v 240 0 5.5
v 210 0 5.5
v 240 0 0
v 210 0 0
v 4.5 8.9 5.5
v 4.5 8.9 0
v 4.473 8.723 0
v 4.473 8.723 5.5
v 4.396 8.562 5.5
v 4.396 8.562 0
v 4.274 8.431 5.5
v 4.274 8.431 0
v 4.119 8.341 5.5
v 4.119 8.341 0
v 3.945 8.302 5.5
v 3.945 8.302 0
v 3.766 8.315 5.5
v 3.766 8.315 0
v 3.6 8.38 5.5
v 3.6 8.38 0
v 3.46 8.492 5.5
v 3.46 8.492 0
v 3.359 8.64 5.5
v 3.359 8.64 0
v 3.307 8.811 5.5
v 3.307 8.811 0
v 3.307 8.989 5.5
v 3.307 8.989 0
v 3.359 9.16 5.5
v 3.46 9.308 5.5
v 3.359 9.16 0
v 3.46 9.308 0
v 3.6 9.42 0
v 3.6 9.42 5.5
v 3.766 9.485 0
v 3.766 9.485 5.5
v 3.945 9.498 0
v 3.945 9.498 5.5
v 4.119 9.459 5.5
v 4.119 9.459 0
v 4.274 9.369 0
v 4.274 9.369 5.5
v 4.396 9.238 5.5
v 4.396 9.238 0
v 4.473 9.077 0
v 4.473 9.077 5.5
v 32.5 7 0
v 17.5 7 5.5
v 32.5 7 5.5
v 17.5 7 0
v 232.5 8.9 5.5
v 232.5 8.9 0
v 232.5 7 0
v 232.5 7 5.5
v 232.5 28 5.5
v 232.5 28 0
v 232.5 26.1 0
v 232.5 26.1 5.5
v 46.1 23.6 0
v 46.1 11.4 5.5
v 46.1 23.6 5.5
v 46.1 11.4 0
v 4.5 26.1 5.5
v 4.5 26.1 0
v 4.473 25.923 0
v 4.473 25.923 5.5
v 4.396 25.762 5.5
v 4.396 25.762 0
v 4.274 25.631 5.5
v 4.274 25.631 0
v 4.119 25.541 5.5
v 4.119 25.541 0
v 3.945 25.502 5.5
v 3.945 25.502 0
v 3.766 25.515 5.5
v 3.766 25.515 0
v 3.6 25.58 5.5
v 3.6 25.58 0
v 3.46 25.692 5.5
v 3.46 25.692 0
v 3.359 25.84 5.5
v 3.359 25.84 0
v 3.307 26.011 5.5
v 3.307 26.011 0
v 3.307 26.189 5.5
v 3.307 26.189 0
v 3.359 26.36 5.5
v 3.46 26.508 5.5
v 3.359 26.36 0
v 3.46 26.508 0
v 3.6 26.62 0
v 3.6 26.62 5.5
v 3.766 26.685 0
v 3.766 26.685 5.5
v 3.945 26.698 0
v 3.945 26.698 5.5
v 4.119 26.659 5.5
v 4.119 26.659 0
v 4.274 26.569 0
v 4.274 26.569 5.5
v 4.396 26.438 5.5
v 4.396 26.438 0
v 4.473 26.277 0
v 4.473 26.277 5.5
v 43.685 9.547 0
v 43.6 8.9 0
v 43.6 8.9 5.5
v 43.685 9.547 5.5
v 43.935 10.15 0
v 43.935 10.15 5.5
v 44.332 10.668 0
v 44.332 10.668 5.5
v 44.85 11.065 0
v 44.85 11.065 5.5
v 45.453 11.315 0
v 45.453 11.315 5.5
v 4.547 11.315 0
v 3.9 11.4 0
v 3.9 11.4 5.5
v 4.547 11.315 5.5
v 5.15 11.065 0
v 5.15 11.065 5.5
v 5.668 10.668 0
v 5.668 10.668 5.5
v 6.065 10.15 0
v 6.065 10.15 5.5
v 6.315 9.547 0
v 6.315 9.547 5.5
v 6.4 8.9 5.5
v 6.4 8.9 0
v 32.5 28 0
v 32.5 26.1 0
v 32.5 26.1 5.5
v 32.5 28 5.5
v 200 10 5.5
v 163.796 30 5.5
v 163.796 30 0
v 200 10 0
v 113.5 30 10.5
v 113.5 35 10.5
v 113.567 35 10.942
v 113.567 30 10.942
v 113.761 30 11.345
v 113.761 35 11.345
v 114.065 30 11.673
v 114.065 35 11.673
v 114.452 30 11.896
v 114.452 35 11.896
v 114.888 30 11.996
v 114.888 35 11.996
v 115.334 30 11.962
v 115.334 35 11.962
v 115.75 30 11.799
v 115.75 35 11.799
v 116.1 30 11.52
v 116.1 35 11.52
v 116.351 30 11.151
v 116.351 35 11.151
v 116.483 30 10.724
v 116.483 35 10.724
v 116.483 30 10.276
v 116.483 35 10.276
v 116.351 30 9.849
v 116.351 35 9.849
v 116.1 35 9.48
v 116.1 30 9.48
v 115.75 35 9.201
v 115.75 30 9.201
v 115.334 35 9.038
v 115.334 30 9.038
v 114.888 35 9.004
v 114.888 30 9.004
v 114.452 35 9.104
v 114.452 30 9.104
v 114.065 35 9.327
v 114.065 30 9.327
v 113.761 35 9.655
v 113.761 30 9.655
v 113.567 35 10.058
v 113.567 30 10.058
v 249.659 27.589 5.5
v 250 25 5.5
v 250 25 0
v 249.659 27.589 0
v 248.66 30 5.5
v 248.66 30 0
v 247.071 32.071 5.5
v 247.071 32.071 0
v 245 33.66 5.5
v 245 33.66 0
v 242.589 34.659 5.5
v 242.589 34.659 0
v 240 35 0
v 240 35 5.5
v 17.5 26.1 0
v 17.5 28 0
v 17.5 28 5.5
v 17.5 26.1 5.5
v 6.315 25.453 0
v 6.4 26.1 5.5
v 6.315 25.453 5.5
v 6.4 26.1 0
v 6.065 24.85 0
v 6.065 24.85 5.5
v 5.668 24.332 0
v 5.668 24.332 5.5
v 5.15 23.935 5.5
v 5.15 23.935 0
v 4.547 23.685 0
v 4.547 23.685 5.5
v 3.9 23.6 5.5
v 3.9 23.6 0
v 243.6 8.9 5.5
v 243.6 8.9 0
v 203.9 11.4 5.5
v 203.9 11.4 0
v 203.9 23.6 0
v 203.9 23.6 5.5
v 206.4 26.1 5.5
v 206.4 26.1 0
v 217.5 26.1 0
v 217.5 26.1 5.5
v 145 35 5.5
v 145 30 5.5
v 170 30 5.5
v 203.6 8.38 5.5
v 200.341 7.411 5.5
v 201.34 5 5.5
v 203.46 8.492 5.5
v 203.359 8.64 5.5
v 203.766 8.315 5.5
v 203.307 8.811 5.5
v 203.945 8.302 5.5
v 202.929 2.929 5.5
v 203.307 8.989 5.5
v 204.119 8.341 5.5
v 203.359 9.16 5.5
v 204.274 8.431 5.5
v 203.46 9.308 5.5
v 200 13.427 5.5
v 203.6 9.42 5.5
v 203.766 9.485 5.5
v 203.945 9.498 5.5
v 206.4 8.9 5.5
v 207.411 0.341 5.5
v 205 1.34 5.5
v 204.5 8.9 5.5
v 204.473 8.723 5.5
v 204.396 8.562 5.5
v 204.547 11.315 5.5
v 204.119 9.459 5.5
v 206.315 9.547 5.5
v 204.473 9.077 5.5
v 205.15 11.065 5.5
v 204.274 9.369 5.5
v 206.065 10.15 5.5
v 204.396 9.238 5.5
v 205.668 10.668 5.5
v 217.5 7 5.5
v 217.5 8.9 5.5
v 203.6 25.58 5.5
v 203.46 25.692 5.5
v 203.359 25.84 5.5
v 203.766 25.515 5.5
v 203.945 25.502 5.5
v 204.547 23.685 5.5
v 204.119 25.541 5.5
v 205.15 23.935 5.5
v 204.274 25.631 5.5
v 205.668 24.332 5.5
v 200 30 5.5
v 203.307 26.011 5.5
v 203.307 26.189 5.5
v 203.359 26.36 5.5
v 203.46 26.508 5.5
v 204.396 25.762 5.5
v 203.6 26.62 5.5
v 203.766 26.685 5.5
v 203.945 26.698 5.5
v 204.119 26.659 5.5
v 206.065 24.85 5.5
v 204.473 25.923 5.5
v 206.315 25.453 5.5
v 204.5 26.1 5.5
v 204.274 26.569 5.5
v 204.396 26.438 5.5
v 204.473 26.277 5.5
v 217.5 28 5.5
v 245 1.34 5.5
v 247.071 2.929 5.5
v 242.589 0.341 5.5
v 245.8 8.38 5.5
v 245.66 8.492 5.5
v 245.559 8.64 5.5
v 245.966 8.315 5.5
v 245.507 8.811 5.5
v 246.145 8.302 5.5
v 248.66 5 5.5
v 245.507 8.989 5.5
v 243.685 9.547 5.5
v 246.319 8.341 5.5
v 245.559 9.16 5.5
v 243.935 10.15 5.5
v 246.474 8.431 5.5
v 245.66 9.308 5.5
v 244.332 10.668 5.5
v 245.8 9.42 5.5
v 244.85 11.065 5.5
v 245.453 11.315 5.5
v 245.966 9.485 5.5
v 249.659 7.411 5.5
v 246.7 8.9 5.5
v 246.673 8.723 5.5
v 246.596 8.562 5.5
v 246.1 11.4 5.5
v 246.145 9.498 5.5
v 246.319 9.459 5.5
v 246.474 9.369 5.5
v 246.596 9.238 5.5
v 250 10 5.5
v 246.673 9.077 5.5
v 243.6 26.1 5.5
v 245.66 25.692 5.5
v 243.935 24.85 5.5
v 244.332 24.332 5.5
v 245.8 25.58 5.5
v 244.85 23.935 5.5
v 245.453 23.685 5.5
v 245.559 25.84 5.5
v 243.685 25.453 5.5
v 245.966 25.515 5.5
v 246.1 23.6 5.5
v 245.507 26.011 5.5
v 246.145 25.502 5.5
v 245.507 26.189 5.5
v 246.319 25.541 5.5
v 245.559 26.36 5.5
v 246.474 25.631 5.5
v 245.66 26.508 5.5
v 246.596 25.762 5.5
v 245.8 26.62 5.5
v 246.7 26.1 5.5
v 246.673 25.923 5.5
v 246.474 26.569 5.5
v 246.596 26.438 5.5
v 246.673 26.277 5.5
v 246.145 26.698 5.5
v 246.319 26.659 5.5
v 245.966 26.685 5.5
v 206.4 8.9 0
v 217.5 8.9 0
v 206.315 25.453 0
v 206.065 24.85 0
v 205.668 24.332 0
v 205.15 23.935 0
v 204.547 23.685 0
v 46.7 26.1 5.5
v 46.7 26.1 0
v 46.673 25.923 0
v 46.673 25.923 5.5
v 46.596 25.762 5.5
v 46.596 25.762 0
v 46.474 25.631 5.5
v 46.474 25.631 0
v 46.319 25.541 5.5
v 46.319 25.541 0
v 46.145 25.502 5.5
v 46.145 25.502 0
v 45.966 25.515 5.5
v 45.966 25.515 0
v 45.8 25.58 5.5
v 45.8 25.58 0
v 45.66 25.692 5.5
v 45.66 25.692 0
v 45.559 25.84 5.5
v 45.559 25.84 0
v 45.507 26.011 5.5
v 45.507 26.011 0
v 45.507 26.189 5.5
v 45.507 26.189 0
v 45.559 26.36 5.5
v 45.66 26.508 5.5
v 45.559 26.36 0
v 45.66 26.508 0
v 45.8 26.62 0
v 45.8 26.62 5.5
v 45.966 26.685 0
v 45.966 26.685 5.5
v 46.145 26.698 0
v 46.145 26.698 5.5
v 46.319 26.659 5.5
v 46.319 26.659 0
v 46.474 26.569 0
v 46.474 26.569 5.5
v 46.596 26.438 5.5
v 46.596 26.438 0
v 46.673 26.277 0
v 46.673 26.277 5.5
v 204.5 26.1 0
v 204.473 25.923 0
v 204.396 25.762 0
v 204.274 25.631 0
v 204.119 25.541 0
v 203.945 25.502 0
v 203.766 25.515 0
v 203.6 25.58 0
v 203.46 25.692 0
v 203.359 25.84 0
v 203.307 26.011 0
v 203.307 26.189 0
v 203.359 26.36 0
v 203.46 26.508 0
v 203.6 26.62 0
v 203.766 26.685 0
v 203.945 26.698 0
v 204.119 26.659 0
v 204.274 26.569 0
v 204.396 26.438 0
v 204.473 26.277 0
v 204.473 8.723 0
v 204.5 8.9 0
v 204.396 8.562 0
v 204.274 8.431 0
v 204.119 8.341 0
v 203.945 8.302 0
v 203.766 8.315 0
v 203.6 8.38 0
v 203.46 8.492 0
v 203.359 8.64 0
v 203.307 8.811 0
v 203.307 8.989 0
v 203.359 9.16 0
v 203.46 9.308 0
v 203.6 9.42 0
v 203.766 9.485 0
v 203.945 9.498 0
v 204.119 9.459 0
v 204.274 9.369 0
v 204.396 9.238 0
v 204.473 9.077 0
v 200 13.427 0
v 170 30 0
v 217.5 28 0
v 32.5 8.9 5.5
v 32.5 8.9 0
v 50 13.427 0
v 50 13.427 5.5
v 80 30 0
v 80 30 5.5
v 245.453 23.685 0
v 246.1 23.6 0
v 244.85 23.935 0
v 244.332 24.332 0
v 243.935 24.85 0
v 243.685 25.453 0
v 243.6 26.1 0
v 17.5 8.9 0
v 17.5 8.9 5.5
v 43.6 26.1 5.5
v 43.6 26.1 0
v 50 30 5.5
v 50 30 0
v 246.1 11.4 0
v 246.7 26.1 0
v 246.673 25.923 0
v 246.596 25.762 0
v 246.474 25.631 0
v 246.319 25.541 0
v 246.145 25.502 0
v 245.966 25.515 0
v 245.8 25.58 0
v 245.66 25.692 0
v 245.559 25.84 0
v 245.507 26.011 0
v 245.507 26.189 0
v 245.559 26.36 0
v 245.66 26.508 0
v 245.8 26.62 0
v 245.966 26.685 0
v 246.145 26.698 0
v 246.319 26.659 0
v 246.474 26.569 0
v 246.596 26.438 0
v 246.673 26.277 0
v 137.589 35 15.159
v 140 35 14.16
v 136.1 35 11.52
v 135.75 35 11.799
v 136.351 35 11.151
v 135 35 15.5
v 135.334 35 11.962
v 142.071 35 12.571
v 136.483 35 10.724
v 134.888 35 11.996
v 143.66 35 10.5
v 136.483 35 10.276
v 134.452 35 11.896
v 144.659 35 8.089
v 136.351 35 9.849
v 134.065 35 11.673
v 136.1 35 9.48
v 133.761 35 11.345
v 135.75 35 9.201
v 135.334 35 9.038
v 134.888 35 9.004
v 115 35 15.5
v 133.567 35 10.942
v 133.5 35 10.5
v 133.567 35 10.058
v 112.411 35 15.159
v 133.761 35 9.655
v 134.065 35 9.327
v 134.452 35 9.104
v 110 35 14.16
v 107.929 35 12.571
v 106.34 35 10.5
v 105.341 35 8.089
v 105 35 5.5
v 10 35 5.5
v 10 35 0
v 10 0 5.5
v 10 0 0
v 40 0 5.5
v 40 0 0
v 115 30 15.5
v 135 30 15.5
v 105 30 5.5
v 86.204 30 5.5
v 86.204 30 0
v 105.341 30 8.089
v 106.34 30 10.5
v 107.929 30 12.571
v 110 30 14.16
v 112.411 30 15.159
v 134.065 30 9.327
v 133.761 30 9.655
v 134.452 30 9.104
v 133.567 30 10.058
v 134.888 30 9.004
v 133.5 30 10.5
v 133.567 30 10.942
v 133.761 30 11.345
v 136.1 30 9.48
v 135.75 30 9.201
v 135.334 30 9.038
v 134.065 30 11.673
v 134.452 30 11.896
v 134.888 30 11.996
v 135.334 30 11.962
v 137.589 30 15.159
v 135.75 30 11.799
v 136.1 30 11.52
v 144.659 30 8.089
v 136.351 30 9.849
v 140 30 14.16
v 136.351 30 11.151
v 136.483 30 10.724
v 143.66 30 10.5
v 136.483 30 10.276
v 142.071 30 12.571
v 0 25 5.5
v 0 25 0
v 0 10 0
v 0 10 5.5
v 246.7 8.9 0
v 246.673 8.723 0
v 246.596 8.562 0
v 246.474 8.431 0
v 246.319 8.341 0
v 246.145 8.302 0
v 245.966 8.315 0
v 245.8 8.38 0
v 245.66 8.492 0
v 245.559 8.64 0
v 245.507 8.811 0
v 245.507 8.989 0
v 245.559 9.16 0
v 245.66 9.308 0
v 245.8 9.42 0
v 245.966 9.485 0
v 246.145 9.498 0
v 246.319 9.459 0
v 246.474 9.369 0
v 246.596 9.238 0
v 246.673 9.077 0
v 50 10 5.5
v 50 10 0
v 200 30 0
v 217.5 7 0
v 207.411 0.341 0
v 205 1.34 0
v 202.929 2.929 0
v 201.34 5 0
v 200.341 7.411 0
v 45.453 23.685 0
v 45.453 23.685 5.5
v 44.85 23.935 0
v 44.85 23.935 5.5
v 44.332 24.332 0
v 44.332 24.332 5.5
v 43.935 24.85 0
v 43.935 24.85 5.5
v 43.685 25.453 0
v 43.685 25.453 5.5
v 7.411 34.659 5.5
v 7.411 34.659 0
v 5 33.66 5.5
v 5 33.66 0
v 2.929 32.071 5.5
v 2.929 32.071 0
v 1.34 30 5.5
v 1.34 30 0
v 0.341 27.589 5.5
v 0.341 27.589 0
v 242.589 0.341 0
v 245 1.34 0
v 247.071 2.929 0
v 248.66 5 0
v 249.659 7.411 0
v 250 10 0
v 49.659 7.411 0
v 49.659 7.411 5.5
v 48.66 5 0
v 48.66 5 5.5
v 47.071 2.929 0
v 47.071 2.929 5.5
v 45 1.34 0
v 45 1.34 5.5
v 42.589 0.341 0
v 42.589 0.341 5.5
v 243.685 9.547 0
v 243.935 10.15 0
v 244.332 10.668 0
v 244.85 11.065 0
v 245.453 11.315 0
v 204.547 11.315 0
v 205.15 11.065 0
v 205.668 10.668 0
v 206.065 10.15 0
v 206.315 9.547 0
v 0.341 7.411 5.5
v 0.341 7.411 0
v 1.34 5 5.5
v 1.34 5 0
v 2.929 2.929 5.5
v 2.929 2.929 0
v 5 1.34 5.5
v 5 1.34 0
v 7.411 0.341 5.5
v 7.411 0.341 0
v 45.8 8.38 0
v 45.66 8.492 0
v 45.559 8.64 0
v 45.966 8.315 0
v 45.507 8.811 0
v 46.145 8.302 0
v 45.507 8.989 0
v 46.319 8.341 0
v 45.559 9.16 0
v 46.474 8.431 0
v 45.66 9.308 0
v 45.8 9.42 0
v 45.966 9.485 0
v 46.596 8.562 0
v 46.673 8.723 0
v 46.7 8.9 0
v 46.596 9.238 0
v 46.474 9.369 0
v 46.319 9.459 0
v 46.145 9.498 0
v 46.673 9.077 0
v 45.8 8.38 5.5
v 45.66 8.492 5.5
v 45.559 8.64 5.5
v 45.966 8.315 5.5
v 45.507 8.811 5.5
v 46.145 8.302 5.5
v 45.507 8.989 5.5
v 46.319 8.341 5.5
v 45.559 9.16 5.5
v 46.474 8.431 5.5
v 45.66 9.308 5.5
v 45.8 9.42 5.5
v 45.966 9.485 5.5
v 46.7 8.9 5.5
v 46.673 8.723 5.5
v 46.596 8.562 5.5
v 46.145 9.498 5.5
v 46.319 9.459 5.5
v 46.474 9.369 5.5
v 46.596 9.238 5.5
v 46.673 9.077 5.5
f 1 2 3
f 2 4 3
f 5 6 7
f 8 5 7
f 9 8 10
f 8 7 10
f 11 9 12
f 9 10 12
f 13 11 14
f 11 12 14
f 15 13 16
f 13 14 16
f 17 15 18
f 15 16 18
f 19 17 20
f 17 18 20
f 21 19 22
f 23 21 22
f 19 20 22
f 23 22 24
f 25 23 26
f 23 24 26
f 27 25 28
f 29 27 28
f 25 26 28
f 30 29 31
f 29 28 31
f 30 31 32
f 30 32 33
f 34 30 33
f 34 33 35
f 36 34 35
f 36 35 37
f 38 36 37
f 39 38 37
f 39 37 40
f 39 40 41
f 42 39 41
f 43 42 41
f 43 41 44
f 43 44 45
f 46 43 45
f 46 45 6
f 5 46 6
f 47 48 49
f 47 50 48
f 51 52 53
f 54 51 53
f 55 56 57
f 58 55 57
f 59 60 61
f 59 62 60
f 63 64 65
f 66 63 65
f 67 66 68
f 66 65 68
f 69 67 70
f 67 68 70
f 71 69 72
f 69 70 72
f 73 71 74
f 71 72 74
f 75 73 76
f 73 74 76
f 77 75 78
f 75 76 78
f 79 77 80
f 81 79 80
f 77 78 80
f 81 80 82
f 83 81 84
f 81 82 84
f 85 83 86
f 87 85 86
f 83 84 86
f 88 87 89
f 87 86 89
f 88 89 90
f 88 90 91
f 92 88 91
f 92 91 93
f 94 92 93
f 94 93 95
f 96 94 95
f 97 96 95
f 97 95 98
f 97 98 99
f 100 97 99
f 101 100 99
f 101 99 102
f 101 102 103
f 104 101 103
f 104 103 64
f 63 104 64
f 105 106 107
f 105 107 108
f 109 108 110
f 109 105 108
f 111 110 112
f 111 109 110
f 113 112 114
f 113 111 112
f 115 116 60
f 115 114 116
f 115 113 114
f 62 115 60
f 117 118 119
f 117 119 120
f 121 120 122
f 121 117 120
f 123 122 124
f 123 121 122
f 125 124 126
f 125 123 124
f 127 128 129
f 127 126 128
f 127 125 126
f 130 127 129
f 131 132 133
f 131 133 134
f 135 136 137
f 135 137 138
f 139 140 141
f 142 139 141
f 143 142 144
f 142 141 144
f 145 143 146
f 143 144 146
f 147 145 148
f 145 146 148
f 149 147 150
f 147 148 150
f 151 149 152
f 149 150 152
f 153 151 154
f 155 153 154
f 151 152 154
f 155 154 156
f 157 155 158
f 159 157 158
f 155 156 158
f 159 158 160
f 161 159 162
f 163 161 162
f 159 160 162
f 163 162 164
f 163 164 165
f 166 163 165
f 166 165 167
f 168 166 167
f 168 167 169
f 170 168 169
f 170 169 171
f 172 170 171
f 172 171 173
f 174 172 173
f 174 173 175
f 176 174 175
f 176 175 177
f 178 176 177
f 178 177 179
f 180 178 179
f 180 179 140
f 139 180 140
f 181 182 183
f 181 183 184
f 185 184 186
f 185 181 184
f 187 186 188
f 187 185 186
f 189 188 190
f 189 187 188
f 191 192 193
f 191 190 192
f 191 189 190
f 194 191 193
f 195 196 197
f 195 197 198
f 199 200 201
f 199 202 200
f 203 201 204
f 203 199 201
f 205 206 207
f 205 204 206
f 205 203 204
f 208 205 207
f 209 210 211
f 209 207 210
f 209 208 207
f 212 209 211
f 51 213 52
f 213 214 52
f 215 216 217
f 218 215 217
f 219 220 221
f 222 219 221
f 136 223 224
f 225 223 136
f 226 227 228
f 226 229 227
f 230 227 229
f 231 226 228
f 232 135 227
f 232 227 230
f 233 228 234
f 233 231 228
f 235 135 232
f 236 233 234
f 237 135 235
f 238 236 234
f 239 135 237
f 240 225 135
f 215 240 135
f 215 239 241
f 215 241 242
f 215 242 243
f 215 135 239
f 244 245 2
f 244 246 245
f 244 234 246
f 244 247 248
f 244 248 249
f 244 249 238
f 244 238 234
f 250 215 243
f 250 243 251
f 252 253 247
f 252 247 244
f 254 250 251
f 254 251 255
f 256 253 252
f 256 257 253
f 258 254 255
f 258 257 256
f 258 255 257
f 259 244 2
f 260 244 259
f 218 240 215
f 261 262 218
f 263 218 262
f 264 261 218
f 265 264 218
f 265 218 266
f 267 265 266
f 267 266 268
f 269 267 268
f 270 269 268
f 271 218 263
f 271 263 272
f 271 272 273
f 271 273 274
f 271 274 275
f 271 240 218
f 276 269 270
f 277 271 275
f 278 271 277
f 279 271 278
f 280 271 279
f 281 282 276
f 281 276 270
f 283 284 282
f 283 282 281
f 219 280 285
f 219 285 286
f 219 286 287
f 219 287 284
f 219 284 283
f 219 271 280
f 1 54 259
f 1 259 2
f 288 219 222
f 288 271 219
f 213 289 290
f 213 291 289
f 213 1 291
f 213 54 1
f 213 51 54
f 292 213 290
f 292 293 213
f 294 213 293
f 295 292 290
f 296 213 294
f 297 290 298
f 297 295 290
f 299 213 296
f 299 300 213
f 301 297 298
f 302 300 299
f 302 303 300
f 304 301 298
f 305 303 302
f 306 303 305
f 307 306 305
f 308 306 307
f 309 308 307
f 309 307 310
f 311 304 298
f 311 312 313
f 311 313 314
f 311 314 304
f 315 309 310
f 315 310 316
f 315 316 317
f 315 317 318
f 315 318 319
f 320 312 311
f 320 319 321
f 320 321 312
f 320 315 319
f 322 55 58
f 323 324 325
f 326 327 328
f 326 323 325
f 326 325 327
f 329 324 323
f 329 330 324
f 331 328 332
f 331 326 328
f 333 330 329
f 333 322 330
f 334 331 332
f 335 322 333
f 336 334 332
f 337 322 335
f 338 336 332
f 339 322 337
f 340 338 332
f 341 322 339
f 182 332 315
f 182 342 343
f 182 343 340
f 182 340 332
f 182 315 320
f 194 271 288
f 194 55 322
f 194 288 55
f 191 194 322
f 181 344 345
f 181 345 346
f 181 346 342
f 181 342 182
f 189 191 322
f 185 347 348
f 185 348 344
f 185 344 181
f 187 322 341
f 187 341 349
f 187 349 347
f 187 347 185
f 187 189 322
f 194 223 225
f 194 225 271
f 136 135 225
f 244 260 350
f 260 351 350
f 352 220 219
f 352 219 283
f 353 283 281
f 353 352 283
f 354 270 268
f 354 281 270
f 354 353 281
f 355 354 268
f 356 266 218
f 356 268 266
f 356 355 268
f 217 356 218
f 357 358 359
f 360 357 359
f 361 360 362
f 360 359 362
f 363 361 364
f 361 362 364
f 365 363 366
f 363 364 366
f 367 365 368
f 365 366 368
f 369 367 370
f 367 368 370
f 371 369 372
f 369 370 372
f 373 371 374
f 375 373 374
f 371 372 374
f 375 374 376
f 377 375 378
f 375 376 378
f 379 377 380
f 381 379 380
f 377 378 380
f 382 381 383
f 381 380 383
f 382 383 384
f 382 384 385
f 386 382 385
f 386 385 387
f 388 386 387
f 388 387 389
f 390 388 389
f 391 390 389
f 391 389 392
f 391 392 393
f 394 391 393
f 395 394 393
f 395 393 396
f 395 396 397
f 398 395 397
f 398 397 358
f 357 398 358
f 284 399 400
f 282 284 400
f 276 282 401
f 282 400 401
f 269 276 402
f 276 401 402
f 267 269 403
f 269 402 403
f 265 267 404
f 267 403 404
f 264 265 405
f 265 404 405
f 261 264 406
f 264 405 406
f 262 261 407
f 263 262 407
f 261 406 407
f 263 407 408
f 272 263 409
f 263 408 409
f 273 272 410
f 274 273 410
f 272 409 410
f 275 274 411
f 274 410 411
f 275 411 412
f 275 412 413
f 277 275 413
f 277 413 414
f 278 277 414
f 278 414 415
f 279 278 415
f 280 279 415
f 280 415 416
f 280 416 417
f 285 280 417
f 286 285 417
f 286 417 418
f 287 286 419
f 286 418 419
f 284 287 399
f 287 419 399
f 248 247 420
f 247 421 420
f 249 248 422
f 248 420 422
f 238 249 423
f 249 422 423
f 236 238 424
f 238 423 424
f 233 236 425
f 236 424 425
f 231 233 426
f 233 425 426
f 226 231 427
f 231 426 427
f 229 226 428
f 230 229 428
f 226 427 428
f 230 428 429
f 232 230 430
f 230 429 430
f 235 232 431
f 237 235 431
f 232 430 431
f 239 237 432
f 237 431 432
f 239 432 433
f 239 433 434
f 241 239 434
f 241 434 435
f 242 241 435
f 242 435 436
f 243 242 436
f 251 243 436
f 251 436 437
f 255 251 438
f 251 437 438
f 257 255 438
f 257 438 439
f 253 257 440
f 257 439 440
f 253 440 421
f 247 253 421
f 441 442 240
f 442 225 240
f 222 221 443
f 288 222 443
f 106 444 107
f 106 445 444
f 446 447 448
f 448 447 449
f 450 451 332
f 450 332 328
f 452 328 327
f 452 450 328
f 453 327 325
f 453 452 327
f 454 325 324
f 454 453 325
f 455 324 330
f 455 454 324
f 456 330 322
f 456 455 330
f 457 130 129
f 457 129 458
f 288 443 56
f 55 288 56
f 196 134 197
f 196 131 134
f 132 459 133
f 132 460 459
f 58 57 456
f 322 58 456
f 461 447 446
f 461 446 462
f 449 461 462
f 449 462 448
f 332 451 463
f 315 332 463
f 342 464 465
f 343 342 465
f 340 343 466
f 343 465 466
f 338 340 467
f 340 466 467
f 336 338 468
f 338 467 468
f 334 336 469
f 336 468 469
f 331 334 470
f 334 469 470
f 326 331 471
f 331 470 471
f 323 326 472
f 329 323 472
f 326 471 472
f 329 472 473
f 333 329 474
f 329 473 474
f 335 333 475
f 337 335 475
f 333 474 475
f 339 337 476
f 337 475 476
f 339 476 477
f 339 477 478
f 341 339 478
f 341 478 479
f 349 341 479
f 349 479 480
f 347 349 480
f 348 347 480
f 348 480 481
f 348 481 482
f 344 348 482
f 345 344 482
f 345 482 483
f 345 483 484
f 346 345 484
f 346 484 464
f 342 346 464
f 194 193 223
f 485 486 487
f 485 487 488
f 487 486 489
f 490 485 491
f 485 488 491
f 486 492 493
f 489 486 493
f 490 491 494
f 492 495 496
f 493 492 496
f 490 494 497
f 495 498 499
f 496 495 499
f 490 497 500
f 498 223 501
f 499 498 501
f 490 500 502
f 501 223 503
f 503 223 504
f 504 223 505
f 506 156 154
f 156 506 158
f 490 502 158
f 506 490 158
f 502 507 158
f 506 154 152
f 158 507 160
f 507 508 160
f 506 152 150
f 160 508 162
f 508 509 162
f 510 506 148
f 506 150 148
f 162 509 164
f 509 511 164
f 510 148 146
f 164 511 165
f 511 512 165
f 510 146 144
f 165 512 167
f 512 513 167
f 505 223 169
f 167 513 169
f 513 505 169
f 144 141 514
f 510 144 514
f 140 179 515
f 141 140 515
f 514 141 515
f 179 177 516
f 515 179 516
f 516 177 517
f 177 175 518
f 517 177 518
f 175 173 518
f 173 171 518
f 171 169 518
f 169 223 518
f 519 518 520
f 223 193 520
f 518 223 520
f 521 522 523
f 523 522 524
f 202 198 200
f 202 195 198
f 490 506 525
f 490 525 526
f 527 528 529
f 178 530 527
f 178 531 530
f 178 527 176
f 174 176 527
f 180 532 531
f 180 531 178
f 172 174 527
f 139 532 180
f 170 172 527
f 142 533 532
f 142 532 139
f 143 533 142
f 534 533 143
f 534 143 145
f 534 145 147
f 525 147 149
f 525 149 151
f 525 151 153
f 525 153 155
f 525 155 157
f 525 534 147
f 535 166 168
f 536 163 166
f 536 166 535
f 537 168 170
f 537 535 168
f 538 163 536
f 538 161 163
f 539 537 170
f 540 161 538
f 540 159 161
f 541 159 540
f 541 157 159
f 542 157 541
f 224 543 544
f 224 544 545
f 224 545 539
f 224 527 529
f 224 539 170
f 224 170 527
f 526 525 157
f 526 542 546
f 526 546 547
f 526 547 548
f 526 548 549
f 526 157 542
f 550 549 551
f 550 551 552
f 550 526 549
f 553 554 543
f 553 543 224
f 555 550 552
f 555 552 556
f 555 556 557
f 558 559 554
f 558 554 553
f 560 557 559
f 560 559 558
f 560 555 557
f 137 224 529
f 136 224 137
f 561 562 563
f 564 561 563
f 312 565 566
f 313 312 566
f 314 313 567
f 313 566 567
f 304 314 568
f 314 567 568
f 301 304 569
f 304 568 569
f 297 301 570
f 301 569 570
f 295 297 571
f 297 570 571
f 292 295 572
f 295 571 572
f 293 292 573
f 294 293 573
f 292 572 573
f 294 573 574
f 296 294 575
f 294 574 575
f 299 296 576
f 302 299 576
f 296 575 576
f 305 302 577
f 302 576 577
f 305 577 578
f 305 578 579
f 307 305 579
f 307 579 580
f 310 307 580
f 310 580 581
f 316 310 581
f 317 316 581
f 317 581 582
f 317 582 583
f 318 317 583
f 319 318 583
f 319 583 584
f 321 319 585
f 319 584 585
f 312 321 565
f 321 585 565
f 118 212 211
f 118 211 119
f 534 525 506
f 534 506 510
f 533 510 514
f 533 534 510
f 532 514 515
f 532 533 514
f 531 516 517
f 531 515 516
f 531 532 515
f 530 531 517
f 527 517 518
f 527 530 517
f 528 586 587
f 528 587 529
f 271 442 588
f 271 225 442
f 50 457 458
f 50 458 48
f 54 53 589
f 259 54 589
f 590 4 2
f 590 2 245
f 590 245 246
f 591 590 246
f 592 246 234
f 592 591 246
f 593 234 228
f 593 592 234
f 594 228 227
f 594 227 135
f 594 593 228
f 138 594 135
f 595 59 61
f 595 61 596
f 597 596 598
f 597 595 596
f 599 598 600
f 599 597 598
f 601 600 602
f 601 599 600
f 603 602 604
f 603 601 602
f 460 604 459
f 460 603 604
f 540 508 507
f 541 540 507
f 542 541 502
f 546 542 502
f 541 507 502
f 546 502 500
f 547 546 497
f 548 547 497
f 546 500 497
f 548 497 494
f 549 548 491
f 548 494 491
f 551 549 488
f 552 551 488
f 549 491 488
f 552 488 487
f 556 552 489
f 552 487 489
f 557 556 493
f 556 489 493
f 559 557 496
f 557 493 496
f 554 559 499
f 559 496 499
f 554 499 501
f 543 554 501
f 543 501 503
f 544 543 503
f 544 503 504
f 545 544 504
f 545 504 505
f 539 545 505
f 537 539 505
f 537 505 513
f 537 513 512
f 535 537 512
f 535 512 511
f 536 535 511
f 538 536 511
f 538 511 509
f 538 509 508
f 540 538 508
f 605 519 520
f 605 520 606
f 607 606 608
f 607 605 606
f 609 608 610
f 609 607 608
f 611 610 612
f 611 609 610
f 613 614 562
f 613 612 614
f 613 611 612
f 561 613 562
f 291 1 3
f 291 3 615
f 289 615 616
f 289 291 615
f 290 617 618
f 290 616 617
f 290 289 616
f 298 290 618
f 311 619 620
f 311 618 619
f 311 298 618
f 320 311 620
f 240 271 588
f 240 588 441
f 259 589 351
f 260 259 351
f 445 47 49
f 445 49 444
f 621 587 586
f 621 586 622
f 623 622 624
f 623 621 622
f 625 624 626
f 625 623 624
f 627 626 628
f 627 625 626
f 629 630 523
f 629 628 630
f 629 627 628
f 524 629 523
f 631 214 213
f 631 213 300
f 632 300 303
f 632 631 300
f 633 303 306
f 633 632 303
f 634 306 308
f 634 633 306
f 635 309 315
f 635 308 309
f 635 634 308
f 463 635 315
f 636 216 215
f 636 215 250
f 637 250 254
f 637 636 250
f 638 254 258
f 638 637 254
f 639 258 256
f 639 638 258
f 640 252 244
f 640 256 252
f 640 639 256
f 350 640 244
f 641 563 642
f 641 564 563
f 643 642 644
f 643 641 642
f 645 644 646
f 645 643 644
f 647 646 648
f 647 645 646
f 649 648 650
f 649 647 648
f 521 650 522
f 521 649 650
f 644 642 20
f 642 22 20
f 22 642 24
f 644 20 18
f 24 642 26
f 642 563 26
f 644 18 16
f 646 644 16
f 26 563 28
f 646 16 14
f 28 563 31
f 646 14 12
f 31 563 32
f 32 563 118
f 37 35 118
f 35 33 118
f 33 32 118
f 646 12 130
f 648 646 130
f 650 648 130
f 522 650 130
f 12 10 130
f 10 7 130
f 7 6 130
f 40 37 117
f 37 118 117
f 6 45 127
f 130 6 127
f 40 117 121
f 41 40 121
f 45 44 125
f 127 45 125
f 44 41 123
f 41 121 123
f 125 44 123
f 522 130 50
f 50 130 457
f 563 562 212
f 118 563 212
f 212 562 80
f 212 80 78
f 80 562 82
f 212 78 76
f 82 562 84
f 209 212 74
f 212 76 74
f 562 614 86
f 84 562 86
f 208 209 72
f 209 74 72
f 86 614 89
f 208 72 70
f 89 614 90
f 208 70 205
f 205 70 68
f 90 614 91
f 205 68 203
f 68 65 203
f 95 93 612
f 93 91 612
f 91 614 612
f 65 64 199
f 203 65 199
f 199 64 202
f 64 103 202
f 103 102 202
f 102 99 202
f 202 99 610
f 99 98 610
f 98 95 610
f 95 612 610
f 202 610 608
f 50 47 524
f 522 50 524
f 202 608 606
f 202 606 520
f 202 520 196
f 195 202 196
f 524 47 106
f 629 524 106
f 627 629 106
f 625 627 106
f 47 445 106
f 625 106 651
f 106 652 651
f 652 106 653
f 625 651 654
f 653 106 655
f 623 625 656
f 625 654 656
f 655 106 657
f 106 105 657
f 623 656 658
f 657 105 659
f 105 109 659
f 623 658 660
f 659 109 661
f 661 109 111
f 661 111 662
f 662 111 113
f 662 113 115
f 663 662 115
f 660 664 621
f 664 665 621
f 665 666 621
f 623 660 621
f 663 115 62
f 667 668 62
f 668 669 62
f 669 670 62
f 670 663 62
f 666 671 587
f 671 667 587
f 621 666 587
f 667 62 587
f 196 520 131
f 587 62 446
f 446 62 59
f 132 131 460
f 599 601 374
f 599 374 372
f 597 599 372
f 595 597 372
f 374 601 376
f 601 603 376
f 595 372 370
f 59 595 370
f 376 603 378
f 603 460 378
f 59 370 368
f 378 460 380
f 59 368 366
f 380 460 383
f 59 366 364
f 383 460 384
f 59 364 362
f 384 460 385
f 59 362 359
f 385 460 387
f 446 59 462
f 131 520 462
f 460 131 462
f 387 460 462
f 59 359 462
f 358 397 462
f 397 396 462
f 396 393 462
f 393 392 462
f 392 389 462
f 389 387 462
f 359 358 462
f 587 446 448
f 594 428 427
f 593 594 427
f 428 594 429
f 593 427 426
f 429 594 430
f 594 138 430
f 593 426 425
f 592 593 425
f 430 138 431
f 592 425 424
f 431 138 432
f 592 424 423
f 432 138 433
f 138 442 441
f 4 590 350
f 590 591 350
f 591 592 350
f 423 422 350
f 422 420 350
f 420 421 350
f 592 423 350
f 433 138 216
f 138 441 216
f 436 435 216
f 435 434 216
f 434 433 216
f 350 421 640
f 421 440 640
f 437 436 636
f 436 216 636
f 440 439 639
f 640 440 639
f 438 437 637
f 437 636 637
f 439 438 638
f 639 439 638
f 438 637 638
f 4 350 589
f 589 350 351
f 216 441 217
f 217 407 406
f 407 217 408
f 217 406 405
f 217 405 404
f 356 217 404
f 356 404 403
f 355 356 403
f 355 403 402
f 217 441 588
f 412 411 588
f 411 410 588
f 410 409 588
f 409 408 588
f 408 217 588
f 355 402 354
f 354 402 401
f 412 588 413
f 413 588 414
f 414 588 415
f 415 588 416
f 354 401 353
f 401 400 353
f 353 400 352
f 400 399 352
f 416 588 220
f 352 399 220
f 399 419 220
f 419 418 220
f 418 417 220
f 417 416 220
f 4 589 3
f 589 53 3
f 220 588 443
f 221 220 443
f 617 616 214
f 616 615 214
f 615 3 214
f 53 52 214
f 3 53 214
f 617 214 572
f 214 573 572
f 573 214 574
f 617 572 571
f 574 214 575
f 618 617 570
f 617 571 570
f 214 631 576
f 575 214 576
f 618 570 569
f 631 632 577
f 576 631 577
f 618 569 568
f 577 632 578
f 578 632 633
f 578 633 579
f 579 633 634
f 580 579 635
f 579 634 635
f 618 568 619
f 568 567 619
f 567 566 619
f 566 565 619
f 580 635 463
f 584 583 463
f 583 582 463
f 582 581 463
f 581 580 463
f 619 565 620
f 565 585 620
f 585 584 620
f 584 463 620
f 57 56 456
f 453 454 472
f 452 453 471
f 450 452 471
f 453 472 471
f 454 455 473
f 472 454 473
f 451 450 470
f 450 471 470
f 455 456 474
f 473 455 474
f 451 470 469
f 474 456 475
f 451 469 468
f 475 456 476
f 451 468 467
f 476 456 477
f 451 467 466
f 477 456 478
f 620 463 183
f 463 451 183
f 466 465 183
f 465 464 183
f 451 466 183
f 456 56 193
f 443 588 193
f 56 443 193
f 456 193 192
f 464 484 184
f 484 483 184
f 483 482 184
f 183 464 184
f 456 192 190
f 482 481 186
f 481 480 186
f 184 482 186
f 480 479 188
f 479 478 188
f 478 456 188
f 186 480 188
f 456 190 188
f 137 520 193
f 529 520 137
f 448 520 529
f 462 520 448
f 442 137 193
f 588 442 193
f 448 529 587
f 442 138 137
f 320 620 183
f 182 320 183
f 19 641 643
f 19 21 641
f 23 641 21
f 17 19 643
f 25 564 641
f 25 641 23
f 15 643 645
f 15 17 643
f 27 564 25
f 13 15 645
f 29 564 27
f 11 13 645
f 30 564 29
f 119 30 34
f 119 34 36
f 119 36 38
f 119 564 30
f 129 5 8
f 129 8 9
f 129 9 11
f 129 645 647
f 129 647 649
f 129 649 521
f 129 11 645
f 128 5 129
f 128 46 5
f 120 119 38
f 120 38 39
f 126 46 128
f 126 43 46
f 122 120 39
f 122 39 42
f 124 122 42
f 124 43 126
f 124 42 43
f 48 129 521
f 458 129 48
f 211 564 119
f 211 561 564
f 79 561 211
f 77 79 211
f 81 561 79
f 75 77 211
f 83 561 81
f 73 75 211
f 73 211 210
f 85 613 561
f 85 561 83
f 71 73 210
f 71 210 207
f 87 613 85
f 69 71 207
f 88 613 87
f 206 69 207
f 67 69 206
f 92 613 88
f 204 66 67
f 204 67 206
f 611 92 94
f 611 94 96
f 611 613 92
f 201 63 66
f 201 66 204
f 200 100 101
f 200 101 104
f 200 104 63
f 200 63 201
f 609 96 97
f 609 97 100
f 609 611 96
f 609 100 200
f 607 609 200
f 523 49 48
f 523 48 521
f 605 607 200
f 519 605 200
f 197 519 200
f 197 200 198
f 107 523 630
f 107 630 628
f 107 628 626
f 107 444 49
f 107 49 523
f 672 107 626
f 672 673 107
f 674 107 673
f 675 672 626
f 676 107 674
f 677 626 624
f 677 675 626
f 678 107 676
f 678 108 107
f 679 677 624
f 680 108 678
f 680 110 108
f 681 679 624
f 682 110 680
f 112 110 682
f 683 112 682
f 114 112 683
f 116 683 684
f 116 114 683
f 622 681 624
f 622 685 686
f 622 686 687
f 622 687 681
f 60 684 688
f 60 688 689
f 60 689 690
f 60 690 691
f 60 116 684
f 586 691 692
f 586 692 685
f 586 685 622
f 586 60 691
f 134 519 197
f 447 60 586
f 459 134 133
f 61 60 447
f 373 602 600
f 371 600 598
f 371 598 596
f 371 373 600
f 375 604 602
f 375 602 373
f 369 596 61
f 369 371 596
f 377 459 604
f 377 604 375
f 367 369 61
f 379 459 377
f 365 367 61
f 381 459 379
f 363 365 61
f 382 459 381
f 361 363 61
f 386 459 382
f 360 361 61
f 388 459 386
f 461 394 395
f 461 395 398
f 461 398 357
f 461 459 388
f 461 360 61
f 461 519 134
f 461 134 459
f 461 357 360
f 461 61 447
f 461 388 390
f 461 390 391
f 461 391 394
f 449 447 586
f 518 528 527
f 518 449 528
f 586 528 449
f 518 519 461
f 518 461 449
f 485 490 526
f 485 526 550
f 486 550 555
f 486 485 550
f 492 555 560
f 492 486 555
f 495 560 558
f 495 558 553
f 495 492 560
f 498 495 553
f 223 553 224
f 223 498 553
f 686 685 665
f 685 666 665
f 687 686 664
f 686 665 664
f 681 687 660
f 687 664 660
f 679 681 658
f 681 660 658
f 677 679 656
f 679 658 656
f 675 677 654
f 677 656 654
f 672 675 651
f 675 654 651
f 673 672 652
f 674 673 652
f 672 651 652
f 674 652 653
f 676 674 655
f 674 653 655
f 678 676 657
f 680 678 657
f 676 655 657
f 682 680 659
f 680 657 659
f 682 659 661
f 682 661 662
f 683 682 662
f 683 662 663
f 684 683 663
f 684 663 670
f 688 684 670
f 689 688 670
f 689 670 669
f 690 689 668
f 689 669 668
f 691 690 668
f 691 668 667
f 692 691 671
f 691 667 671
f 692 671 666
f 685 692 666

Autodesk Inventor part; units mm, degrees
ref_plane "YZ Plane" through (0, 0, 0) normal (1, 0, 0) x (0, 1, 0)
ref_plane "XZ Plane" through (0, 0, 0) normal (0, 1, 0) x (-1, 0, 0)
ref_plane "XY Plane" through (0, 0, 0) normal (0, 0, 1) x (1, 0, 0)
sketch "Sketch1" plane through (0, 0, 0) normal (0, 0, 1) x (1, 0, 0)
  line L0 (0, 0) -> (250, 0)
  line L1 (250, 0) -> (250, 35)
  line L2 (250, 35) -> (0, 35)
  line L3 (0, 35) -> (0, 0)
  line L4 (25, 35) -> (25, 0)
  line L5 (3.9, 8.9) -> (46.1, 8.9)
  line L6 (46.1, 8.9) -> (46.1, 26.1)
  line L7 (46.1, 26.1) -> (3.9, 26.1)
  line L8 (3.9, 26.1) -> (3.9, 8.9)
  line L9 (3.9, 8.9) -> (46.1, 26.1) construction
  line L10 (46.1, 8.9) -> (3.9, 26.1) construction
  circle A0 centre (3.9, 26.1) radius 2.5
  circle A1 centre (46.1, 26.1) radius 2.5
  circle A2 centre (3.9, 8.9) radius 2.5
  circle A3 centre (46.1, 8.9) radius 2.5
  circle A4 centre (3.9, 26.1) radius 0.6
  circle A5 centre (46.1, 26.1) radius 0.6
  circle A6 centre (3.9, 8.9) radius 0.6
  circle A7 centre (46.1, 8.9) radius 0.6
  line L11 (125, 35) -> (125, 0)
  line L12 (225, 35) -> (225, 0)
  line L13 (246.1, 8.9) -> (203.9, 8.9)
  line L14 (203.9, 8.9) -> (203.9, 26.1)
  line L15 (203.9, 26.1) -> (246.1, 26.1)
  line L16 (246.1, 26.1) -> (246.1, 8.9)
  line L17 (246.1, 8.9) -> (203.9, 26.1) construction
  line L18 (203.9, 8.9) -> (246.1, 26.1) construction
  circle A8 centre (246.1, 26.1) radius 2.5
  circle A9 centre (203.9, 26.1) radius 2.5
  circle A10 centre (246.1, 8.9) radius 2.5
  circle A11 centre (203.9, 8.9) radius 2.5
  circle A12 centre (246.1, 26.1) radius 0.6
  circle A13 centre (203.9, 26.1) radius 0.6
  circle A14 centre (246.1, 8.9) radius 0.6
  circle A15 centre (203.9, 8.9) radius 0.6
  line L19 (17.5, 7) -> (32.5, 7)
  line L20 (32.5, 7) -> (32.5, 28)
  line L21 (32.5, 28) -> (17.5, 28)
  line L22 (17.5, 28) -> (17.5, 7)
  line L23 (17.5, 7) -> (32.5, 28) construction
  line L24 (32.5, 7) -> (17.5, 28) construction
  line L25 (46.1, 26.1) -> (3.9, 26.1)
  line L26 (232.5, 7) -> (217.5, 7)
  line L27 (217.5, 7) -> (217.5, 28)
  line L28 (217.5, 28) -> (232.5, 28)
  line L29 (232.5, 28) -> (232.5, 7)
  point P0 (25, 17.5)
  point P1 (225, 17.5)
  point P2 (6.4, 26.1)
  point P3 (17.5, 26.1)
  point P4 (32.5, 26.1)
  point P5 (43.6, 26.1)
  point P6 (46.1, 23.6)
  point P7 (46.1, 11.4)
  point P8 (43.6, 8.9)
  point P9 (32.5, 8.9)
  point P10 (17.5, 8.9)
  point P11 (6.4, 8.9)
  point P12 (3.9, 11.4)
  point P13 (3.9, 23.6)
  point P14 (217.5, 8.9)
  point P15 (206.4, 8.9)
  point P16 (203.9, 11.4)
  point P17 (203.9, 23.6)
  point P18 (206.4, 26.1)
  point P19 (217.5, 26.1)
  point P20 (232.5, 26.1)
  point P21 (243.6, 26.1)
  point P22 (246.1, 23.6)
  point P23 (246.1, 11.4)
  point P24 (243.6, 8.9)
  point P25 (232.5, 8.9)
  dimension "d0" = 250
  dimension "d1" = 35
  dimension "d2" = 17.2
  dimension "d3" = 42.2
  dimension "d4" = 5
  dimension "d5" = 5
  dimension "d6" = 5
  dimension "d7" = 5
  dimension "d8" = 1.2
  dimension "d9" = 1.2
  dimension "d10" = 1.2
  dimension "d11" = 1.2
  dimension "d12" = 25
  dimension "d13" = 15
  dimension "d14" = 21
extrude "Extrusion1" add sketch "Sketch1" along normal blind 5.5 contours L3 L2 L4 L21 L22 L7 A0 L8 A2 L5 L19 L0 | L4 L19 L20 L5 A3 L6 A1 L7 L21 L2 L11 L0 | L11 L2 L12 L28 L27 L15 A9 L14 A11 L13 L26 L0 | L12 L26 L29 L13 A10 L16 A8 L15 L28 L2 L1 L0 | A2 L8 A6 L5 | L5 A6 L8 A2 | A3 L6 A7 L5 | L5 A7 L6 A3 | A1 L6 A5 L7 | L7 A5 L6 A1 | A0 L8 A4 L7 | L7 A4 L8 A0 | A6 L8 L5 | L5 L8 A6 | A7 L6 L5 | L5 L6 A7 | A10 L16 A14 L13 | L13 A14 L16 A10 | A11 L14 A15 L13 | L13 A15 L14 A11 | A5 L6 L7 | L7 L6 A5 | A4 L8 L7 | L7 L8 A4 | A9 L14 A13 L15 | L15 A13 L14 A9 | A8 L16 A12 L15 | L15 A12 L16 A8 | A14 L16 L13 | L13 L16 A14 | A15 L14 L13 | L13 L14 A15 | A13 L14 L15 | L15 L14 A13 | A12 L16 L15 | L15 L16 A12
extrude "Extrusion2" cut sketch "Sketch1" along normal blind 5.5 contours A6 L8 L5 | L5 L8 A6 | A7 L6 L5 | L5 L6 A7 | A5 L6 L7 | L7 L6 A5 | A4 L8 L7 | L7 L8 A4 | A14 L16 L13 | L13 L16 A14 | A15 L14 L13 | L13 L14 A15 | A13 L14 L15 | L15 L14 A13 | A12 L16 L15 | L15 L16 A12
sketch "Sketch2" plane through (0, 0, 5.5) normal (0, 0, 1) x (1, 0, 0)
  line L0 (200, -30) -> (50, -30)
  line L1 (50, -30) -> (50, 30)
  line L2 (50, 30) -> (200, 30)
  line L3 (200, 30) -> (200, -30)
  line L4 (0, 0) -> (250, 0) projected
  line L5 (200, -30) -> (50, 30) construction
  line L6 (50, -30) -> (200, 30) construction
  point P0 (125, 0)
  point P1 (50, 0)
  point P2 (200, 0)
  dimension "d19" = 150
  dimension "d20" = 60
extrude "Extrusion3" cut sketch "Sketch2" against normal blind 5.5 contours L4 L1 L2 L3
sketch "Sketch3" plane through (0, 0, 5.5) normal (0, 0, 1) x (1, 0, 0)
  line L0 (50, 30) -> (200, 30) projected
  line L1 (105, 30) -> (145, 30)
  line L2 (145, 30) -> (145, 35)
  line L3 (145, 35) -> (105, 35)
  line L4 (105, 35) -> (105, 30)
  point P0 (0, 0)
  point P1 (145, 30)
  dimension "d23" = 40
  dimension "d24" = 5
  dimension "d25" = 55
extrude "Extrusion4" add sketch "Sketch3" along normal blind 10
sketch "Sketch4" plane through (105, 35, 5.5) normal (0, 1, 0) x (-1, 0, 0)
  line L0 (0, 10) -> (-40, 10) projected
  line L1 (-20, 10) -> (-20, 0)
  line L2 (-145, 0) -> (105, 0) projected
  circle A0 centre (-10, 5) radius 1.5
  circle A1 centre (-30, 5) radius 1.5
  line L3 (-10, 5) -> (-30, 5)
  point P0 (105, -5.5)
  dimension "d28" = 10
  dimension "d29" = 3
  dimension "d30" = 3
  dimension "d31" = 10
extrude "Extrusion5" cut sketch "Sketch4" against normal blind 10
fillet "Fillet1" radius 10 8 edges at (0, 35, 2.75) (50, 0, 2.75) (0, 0, 2.75) (145, 32.5, 15.5) (105, 32.5, 15.5) (200, 0, 2.75) (250, 0, 2.75) (250, 35, 2.75)
sketch "Sketch5" plane through (0, 0, 5.5) normal (0, 0, 1) x (1, 0, 0)
  arc A0 (40, 0) -> (50, 10) centre (40, 10) ccw projected
  line L0 (50, 10) -> (86.2042, 30)
  line L1 (50, 30) -> (105, 30) projected
  line L2 (50, 10) -> (50, 30) projected
  line L3 (50, 13.4273) -> (80, 30)
  arc A1 (0, 10) -> (10, 0) centre (10, 10) ccw projected
  line L4 (10, 0) -> (40, 0) projected
  arc A2 (40, 0) -> (50, 10) centre (40, 10) ccw projected
  line L5 (50, 10) -> (50, 30) projected
  line L6 (50, 30) -> (105, 30) projected
  line L7 (105, 30) -> (105, 35) projected
  line L8 (105, 35) -> (10, 35) projected
  arc A3 (10, 35) -> (0, 25) centre (10, 25) ccw projected
  line L9 (0, 25) -> (0, 10) projected
  circle A4 centre (46.1, 8.9) radius 0.6 projected
  circle A5 centre (3.9, 8.9) radius 0.6 projected
  circle A6 centre (46.1, 26.1) radius 0.6 projected
  circle A7 centre (3.9, 26.1) radius 0.6 projected
  line L10 (6.4, 26.1) -> (17.5, 26.1) projected
  line L11 (17.5, 26.1) -> (17.5, 28) projected
  line L12 (17.5, 28) -> (32.5, 28) projected
  line L13 (32.5, 28) -> (32.5, 26.1) projected
  line L14 (32.5, 26.1) -> (43.6, 26.1) projected
  arc A8 (43.6, 26.1) -> (46.1, 23.6) centre (46.1, 26.1) ccw projected
  line L15 (46.1, 23.6) -> (46.1, 11.4) projected
  arc A9 (46.1, 11.4) -> (43.6, 8.9) centre (46.1, 8.9) ccw projected
  line L16 (43.6, 8.9) -> (32.5, 8.9) projected
  line L17 (32.5, 8.9) -> (32.5, 7) projected
  line L18 (32.5, 7) -> (17.5, 7) projected
  line L19 (17.5, 7) -> (17.5, 8.9) projected
  line L20 (17.5, 8.9) -> (6.4, 8.9) projected
  arc A10 (6.4, 8.9) -> (3.9, 11.4) centre (3.9, 8.9) ccw projected
  line L21 (3.9, 11.4) -> (3.9, 23.6) projected
  arc A11 (3.9, 23.6) -> (6.4, 26.1) centre (3.9, 26.1) ccw projected
  point P0 (0, 0)
  dimension "d35" = 3
  dimension "d36" = 30
extrude "Extrusion6" add sketch "Sketch5" against normal blind 5.5 contours L2 L3 L1 L0
ref_plane "Work Plane1" through (125, 30, 5.5) normal (1, 0, 0) x (0, 0, -1)
mirror "Mirror1" about plane through (125, 30, 5.5) normal (1, 0, 0) of "Extrusion6"
properties part number "UltrasonicHolder"
